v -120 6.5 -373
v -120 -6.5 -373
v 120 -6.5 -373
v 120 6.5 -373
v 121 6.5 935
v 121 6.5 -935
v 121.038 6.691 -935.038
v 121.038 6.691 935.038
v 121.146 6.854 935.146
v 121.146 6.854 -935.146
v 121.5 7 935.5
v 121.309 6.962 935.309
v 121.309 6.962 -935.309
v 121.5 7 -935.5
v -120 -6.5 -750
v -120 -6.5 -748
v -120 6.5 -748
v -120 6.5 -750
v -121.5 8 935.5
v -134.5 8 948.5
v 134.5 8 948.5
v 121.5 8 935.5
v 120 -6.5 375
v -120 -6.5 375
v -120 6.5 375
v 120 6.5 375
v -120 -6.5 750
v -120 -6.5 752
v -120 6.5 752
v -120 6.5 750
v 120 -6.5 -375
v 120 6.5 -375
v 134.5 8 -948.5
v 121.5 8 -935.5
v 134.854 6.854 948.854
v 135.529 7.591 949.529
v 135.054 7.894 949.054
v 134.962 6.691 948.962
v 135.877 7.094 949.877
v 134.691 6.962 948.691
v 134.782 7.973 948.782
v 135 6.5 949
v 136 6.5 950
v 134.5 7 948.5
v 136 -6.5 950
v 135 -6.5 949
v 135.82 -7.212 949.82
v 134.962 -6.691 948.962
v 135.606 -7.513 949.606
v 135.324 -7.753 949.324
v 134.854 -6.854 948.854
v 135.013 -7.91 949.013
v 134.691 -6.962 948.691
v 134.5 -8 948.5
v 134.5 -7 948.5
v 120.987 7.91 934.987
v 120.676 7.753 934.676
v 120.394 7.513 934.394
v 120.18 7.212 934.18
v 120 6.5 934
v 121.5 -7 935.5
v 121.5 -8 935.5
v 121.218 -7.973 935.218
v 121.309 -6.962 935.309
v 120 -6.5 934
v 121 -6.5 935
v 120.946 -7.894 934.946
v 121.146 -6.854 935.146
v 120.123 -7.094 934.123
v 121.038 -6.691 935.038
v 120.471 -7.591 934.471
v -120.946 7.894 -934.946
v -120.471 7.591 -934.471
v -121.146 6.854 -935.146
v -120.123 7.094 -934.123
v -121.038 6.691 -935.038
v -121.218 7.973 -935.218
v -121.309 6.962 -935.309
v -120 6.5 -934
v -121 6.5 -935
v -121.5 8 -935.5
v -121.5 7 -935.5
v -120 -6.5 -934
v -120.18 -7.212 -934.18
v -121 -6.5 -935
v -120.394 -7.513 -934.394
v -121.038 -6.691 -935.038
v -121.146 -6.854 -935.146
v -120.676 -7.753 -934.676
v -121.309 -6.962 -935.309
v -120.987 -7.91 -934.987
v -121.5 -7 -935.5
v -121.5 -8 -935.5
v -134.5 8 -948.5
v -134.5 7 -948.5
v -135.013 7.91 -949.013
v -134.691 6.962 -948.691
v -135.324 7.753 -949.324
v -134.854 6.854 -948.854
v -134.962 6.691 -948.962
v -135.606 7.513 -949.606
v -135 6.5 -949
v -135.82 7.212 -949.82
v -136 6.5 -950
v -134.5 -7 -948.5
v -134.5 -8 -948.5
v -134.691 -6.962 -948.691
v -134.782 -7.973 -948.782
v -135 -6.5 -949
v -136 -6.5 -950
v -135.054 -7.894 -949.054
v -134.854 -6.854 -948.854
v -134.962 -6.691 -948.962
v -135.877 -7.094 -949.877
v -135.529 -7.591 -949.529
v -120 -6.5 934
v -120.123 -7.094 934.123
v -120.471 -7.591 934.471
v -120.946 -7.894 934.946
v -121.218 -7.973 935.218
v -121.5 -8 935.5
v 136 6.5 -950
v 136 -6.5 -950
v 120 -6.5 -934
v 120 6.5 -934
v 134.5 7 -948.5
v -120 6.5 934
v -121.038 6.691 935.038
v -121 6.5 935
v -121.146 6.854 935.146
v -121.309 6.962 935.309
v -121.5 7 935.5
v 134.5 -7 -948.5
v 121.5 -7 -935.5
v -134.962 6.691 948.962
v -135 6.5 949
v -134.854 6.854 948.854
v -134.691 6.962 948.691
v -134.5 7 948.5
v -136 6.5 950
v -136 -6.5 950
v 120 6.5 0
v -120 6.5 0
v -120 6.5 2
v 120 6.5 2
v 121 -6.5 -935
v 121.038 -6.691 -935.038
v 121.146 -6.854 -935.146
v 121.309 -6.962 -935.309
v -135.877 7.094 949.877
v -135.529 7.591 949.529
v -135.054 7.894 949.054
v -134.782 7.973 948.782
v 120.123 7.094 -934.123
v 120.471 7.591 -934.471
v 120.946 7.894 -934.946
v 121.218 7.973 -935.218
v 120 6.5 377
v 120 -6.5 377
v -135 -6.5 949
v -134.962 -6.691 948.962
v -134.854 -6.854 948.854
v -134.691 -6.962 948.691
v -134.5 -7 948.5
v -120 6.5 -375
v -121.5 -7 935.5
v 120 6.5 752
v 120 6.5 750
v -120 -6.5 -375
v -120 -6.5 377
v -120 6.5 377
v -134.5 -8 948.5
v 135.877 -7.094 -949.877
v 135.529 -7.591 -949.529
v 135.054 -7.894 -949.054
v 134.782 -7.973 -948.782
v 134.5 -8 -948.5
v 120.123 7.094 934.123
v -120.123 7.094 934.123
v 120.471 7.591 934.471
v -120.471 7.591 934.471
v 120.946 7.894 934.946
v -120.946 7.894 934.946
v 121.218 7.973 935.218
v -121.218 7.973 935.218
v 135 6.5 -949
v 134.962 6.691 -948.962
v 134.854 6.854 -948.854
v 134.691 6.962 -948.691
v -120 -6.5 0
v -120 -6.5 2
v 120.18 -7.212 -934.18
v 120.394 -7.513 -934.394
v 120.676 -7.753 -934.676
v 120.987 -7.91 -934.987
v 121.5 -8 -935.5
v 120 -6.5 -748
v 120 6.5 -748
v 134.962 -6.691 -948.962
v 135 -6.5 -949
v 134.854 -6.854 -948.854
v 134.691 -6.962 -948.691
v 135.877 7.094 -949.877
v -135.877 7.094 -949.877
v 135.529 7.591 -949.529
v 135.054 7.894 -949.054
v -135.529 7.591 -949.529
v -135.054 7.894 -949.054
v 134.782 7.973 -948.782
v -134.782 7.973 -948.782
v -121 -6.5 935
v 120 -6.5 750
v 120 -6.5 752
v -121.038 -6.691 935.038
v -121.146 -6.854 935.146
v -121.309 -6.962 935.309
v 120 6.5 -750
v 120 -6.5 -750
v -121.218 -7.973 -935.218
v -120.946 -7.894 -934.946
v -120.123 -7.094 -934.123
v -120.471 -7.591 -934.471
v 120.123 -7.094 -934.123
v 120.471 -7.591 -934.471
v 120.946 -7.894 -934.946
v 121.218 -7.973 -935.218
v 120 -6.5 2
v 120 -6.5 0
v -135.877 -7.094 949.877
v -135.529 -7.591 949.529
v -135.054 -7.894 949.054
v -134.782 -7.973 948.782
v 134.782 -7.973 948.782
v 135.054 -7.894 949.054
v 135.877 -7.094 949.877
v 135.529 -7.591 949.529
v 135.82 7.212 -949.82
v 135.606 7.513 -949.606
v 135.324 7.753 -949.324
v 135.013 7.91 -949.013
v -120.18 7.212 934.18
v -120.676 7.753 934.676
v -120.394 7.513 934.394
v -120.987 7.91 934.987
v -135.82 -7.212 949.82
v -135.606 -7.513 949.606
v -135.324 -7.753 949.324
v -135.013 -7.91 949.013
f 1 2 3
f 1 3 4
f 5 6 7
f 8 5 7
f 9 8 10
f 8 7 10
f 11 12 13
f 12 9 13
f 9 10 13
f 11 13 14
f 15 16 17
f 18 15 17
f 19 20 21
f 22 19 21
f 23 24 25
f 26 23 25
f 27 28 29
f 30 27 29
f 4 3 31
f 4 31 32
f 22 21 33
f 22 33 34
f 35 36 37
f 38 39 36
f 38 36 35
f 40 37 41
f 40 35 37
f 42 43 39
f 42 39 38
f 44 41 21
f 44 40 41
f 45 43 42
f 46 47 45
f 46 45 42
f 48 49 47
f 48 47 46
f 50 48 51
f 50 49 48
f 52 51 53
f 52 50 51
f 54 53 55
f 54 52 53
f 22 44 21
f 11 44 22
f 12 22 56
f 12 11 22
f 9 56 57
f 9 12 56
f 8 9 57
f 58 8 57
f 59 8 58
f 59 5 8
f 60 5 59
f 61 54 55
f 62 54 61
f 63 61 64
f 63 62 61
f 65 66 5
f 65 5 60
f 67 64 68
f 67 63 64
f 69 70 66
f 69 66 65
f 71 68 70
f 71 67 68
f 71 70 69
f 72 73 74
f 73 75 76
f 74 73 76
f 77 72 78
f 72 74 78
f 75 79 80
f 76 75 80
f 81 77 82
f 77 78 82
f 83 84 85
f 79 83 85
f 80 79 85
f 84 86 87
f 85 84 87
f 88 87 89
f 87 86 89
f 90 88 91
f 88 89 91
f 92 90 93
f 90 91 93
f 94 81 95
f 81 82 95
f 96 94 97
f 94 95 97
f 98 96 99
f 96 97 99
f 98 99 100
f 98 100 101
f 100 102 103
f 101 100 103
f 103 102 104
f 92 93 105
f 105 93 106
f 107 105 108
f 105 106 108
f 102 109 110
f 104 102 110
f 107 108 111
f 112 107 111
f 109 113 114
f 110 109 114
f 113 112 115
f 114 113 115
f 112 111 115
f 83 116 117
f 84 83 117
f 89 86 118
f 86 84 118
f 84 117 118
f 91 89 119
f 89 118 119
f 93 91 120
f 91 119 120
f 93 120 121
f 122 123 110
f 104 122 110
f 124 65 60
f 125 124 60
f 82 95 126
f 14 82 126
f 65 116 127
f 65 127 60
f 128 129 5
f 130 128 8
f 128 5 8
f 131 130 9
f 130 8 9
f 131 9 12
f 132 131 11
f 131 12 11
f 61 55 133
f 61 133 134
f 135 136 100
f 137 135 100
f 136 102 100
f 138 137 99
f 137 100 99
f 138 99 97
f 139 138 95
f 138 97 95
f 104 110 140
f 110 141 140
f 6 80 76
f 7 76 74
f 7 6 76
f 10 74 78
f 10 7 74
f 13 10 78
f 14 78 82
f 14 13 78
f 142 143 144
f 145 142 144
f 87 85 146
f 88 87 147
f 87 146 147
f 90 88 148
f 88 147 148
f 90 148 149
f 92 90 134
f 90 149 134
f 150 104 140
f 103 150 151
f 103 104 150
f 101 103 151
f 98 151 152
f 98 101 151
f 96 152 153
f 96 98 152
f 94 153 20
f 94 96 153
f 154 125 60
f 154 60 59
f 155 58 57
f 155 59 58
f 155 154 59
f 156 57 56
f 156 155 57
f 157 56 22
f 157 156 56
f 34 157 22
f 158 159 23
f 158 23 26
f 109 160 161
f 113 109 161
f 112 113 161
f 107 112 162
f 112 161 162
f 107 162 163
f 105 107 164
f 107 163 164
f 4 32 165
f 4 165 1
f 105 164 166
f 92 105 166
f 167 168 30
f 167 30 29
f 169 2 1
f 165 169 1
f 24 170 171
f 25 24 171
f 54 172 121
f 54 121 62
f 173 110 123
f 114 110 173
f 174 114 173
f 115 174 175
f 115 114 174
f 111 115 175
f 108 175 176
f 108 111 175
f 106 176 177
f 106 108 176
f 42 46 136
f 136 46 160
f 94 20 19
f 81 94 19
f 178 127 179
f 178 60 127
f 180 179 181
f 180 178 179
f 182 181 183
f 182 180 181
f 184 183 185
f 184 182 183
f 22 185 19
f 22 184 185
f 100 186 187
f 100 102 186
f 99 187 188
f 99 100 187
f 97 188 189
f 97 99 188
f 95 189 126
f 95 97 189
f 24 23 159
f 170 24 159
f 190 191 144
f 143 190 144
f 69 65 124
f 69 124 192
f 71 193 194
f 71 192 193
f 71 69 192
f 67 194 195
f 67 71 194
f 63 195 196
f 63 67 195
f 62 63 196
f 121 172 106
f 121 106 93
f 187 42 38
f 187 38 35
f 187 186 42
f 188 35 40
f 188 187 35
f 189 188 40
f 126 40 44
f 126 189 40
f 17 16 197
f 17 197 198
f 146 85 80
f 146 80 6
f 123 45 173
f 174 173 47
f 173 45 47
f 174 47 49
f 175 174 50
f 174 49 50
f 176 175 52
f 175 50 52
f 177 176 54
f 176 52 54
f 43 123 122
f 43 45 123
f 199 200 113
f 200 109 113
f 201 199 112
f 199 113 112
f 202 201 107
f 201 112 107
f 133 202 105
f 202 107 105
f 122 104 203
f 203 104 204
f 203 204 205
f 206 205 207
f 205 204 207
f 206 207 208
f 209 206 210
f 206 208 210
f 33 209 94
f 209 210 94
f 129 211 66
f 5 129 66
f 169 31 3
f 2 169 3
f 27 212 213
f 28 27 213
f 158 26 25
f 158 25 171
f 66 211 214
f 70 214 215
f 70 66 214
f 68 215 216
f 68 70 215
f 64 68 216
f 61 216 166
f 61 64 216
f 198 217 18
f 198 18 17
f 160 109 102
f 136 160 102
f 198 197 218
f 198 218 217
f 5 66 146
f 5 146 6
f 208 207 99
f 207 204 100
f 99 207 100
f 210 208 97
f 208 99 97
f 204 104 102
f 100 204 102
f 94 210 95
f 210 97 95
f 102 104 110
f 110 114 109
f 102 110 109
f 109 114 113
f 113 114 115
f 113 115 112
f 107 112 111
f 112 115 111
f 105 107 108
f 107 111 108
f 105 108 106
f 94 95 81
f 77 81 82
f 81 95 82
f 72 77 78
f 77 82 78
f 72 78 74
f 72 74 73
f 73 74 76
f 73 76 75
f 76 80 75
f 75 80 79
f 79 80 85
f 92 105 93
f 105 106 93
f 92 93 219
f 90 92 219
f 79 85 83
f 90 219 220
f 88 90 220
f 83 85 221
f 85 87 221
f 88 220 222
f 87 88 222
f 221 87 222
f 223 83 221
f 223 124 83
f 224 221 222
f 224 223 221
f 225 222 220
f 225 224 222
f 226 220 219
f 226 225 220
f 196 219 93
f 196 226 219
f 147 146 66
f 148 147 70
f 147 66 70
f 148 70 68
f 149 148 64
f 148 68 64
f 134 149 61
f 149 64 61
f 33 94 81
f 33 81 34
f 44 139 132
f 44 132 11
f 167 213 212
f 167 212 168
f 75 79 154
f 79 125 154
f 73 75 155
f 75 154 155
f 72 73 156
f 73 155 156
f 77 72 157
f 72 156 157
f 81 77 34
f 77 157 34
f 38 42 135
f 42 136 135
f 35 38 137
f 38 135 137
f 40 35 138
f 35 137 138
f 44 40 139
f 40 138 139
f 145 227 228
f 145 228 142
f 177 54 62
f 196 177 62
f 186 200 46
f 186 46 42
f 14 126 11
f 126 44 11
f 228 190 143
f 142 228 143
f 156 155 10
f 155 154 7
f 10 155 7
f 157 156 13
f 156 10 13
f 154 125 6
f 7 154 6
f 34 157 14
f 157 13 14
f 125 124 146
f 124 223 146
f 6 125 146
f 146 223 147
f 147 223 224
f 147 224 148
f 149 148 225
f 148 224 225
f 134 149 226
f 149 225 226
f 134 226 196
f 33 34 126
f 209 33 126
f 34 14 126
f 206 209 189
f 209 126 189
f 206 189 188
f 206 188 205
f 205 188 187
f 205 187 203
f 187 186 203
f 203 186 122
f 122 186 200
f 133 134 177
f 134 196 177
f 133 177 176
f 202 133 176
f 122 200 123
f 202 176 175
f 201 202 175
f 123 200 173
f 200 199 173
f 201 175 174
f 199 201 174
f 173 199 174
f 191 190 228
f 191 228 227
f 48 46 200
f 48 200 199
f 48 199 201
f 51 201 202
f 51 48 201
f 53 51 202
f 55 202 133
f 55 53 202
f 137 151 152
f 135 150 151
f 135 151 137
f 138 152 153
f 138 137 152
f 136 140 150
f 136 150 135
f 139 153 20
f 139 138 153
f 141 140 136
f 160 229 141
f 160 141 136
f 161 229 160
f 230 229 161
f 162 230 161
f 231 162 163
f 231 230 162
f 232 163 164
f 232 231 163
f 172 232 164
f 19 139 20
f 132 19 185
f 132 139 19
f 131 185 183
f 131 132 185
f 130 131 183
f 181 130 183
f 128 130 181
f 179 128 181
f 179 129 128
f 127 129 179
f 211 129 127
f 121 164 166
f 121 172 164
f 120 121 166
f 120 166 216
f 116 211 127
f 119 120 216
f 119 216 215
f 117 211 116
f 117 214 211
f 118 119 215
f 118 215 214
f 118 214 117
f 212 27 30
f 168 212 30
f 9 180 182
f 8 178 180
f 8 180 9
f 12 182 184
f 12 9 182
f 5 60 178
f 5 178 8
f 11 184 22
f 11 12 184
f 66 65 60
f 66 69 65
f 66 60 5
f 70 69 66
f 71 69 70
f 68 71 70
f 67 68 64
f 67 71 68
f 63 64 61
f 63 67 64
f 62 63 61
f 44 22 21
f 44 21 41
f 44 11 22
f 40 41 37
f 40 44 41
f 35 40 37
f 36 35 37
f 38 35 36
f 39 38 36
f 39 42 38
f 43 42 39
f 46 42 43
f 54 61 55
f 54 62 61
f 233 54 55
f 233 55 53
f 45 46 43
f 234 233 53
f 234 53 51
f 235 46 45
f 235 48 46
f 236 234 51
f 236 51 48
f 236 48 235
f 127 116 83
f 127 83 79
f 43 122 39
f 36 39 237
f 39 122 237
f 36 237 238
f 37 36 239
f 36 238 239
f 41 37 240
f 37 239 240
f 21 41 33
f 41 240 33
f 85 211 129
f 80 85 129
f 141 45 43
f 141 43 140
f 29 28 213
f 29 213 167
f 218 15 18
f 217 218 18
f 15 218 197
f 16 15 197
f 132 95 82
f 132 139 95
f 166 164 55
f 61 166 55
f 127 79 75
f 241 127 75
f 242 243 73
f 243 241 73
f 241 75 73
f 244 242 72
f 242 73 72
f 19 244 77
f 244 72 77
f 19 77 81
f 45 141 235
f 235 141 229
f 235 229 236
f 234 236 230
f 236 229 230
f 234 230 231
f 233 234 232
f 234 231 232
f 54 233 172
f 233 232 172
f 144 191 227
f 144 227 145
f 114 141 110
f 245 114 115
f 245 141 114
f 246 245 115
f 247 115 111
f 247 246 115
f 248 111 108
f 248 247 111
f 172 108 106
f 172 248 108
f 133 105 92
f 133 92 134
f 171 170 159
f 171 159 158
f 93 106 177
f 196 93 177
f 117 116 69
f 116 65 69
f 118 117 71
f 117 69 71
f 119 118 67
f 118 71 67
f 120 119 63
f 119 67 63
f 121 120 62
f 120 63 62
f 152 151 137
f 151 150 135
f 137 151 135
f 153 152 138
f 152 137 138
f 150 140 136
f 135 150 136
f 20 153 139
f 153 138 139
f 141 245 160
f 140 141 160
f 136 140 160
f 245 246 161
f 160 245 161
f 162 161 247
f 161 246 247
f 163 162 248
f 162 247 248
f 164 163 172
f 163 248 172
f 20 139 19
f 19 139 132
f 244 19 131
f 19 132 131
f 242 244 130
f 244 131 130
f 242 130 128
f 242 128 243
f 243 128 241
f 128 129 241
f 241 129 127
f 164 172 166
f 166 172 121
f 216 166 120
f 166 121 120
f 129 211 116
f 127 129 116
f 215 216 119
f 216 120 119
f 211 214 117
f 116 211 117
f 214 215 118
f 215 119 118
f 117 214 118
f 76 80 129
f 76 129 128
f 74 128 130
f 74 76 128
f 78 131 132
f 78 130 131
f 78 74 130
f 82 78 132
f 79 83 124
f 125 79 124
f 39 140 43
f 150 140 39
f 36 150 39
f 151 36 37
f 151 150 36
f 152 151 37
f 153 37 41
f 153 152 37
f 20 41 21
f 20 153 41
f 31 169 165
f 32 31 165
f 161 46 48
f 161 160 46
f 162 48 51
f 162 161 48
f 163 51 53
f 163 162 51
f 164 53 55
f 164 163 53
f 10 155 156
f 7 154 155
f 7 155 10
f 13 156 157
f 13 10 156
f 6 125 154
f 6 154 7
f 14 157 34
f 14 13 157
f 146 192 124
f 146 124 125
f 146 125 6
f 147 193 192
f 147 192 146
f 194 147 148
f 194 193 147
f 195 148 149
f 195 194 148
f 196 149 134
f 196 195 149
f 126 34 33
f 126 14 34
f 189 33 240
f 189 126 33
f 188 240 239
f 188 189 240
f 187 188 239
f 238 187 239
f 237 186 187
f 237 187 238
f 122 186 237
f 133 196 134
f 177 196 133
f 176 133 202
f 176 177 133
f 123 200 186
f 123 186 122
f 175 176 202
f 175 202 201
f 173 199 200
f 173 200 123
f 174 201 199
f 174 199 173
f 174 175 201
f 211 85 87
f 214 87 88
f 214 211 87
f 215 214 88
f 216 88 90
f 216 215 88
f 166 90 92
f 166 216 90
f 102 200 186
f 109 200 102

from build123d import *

# Parameters (mm, degrees)
F5_W      = 16
F5_H      = 16
F6_DEPTH  = 950
F7_R      = 1.5
F8_T      = -1
F10_DEPTH = 16.001
F12_DEPTH = 16
F13_R     = 1.5
F14_T     = -1
F17_W     = 13
F17_H     = 2
F18_DEPTH = 240


with BuildPart() as f6:
    # F5 (on Top) → F6 (new body, symmetric)
    with BuildSketch(Plane.XY):
        with Locations((-128, 0)):
            Rectangle(F5_W, F5_H)
    extrude(amount=F6_DEPTH, both=True)

    # F7
    f7_edges = [f6.edges().sort_by_distance(p)[0] for p in [
        (-120, -8, 0),
        (-120, 8, 0),
        (-136, 8, 0),
        (-136, -8, 0),
    ]]
    fillet(f7_edges, radius=F7_R)

    # F8
    f8_openings = [f6.faces().sort_by_distance(p)[0] for p in [
        (-128, 0, 950),
        (-128, 0, -950),
    ]]
    offset(amount=F8_T, openings=f8_openings)

    # F9 (on face) → F10 (cut, through all)
    with BuildSketch(Plane.XZ.offset(8)):
        Polygon((-120, 950), (-136, 950), (-120, 934), align=None)
        Polygon((-120, -934), (-136, -950), (-120, -950), align=None)
    extrude(amount=-F10_DEPTH, mode=Mode.SUBTRACT)


with BuildPart() as f12:
    # F11 (on face) → F12 (new body)
    with BuildSketch(Plane.XZ.offset(8)):
        Polygon((136, 950), (-136, 950), (-120, 934), (120, 934), align=None)
    extrude(amount=-F12_DEPTH)

    # F13
    f13_edges = [f12.edges().sort_by_distance(p)[0] for p in [
        (0, -8, 950),
        (0, -8, 934),
        (0, 8, 934),
        (0, 8, 950),
    ]]
    fillet(f13_edges, radius=F13_R)

    # F14
    f14_openings = [f12.faces().sort_by_distance(p)[0] for p in [
        (128, 0, 942),
        (-128, 0, 942),
    ]]
    offset(amount=F14_T, openings=f14_openings)


with BuildPart() as f15_1:
    # F15: instance of F6
    add(f6.part.mirror(Plane.YZ))


with BuildPart() as f16_1:
    # F16: instance of F12
    add(f12.part.mirror(Plane.XY))


with BuildPart() as f18:
    # F17 (on face) → F18 (new body)
    with BuildSketch(Plane.YZ.offset(-120)):
        with Locations((0, -749)):
            Rectangle(F17_W, F17_H)
    extrude(amount=F18_DEPTH)


with BuildPart() as f18b:
    # F17 (on face) → F18, piece 2 (new body)
    with BuildSketch(Plane.YZ.offset(-120)):
        with Locations((0, 751)):
            Rectangle(F17_W, F17_H)
    extrude(amount=F18_DEPTH)


with BuildPart() as f18c:
    # F17 (on face) → F18, piece 3 (new body)
    with BuildSketch(Plane.YZ.offset(-120)):
        with Locations((0, 376)):
            Rectangle(F17_W, F17_H)
    extrude(amount=F18_DEPTH)


with BuildPart() as f18d:
    # F17 (on face) → F18, piece 4 (new body)
    with BuildSketch(Plane.YZ.offset(-120)):
        with Locations((0, 1)):
            Rectangle(F17_W, F17_H)
    extrude(amount=F18_DEPTH)


with BuildPart() as f18e:
    # F17 (on face) → F18, piece 5 (new body)
    with BuildSketch(Plane.YZ.offset(-120)):
        with Locations((0, -374)):
            Rectangle(F17_W, F17_H)
    extrude(amount=F18_DEPTH)


solid = Compound([f6.part, f12.part, f15_1.part, f16_1.part, f18.part, f18b.part, f18c.part, f18d.part, f18e.part])
